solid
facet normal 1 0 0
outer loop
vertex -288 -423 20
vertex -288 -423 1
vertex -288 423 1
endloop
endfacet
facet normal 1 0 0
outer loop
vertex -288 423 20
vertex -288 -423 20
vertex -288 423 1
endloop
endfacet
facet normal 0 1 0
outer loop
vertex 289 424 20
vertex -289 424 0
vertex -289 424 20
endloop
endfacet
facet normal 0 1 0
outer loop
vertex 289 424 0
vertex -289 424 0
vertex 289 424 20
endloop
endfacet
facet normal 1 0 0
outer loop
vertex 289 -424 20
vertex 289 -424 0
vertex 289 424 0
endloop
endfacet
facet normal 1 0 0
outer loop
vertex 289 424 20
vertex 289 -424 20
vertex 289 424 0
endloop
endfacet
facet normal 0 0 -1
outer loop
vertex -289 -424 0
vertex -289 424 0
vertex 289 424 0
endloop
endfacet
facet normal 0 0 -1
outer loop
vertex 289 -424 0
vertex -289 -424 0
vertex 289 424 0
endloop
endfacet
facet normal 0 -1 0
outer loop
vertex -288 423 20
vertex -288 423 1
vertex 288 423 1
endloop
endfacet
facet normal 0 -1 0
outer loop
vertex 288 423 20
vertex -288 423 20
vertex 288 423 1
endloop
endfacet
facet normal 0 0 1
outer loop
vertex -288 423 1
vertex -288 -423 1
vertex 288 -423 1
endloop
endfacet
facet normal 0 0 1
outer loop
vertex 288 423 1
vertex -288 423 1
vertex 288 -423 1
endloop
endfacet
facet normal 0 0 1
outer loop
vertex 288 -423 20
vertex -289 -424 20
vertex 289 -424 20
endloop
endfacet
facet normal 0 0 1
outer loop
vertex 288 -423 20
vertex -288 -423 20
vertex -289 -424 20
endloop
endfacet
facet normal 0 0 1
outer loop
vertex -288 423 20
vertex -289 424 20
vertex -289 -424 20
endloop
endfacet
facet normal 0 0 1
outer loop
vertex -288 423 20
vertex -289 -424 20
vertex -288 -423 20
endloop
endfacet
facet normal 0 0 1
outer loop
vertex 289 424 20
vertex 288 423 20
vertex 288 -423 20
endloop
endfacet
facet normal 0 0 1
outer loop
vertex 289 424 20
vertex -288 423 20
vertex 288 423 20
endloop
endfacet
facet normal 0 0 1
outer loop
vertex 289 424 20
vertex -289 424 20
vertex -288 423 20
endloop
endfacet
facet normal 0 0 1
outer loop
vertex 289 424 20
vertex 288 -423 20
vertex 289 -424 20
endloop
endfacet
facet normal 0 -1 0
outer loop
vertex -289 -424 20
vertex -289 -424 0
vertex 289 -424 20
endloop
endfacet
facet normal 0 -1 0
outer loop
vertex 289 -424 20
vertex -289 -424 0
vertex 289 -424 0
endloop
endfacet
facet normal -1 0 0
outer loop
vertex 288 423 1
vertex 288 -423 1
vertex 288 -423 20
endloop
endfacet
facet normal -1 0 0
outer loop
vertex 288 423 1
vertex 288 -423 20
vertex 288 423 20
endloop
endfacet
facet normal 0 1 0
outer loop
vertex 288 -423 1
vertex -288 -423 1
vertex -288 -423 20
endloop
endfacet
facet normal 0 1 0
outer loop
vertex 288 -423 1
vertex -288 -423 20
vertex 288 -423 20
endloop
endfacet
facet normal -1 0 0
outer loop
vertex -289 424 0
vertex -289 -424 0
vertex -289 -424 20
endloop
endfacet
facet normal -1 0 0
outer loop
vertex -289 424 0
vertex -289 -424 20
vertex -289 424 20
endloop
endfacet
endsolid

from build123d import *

# Parameters (mm, degrees)
SKETCH_1_W      = 578
SKETCH_1_H      = 848
EXTRUDE_1_DEPTH = 20
SHELL_1_T       = -1


with BuildPart() as part:
    # 草图1 → 凸台-拉伸1 (new body)
    with BuildSketch(Plane.XY):
        Rectangle(SKETCH_1_W, SKETCH_1_H)
    extrude(amount=EXTRUDE_1_DEPTH)

    # 抽壳1
    shell_1_openings = [part.faces().sort_by_distance(p)[0] for p in [
        (0, 0, 20),
    ]]
    offset(amount=SHELL_1_T, openings=shell_1_openings, kind=Kind.INTERSECTION)


solid = part.part
